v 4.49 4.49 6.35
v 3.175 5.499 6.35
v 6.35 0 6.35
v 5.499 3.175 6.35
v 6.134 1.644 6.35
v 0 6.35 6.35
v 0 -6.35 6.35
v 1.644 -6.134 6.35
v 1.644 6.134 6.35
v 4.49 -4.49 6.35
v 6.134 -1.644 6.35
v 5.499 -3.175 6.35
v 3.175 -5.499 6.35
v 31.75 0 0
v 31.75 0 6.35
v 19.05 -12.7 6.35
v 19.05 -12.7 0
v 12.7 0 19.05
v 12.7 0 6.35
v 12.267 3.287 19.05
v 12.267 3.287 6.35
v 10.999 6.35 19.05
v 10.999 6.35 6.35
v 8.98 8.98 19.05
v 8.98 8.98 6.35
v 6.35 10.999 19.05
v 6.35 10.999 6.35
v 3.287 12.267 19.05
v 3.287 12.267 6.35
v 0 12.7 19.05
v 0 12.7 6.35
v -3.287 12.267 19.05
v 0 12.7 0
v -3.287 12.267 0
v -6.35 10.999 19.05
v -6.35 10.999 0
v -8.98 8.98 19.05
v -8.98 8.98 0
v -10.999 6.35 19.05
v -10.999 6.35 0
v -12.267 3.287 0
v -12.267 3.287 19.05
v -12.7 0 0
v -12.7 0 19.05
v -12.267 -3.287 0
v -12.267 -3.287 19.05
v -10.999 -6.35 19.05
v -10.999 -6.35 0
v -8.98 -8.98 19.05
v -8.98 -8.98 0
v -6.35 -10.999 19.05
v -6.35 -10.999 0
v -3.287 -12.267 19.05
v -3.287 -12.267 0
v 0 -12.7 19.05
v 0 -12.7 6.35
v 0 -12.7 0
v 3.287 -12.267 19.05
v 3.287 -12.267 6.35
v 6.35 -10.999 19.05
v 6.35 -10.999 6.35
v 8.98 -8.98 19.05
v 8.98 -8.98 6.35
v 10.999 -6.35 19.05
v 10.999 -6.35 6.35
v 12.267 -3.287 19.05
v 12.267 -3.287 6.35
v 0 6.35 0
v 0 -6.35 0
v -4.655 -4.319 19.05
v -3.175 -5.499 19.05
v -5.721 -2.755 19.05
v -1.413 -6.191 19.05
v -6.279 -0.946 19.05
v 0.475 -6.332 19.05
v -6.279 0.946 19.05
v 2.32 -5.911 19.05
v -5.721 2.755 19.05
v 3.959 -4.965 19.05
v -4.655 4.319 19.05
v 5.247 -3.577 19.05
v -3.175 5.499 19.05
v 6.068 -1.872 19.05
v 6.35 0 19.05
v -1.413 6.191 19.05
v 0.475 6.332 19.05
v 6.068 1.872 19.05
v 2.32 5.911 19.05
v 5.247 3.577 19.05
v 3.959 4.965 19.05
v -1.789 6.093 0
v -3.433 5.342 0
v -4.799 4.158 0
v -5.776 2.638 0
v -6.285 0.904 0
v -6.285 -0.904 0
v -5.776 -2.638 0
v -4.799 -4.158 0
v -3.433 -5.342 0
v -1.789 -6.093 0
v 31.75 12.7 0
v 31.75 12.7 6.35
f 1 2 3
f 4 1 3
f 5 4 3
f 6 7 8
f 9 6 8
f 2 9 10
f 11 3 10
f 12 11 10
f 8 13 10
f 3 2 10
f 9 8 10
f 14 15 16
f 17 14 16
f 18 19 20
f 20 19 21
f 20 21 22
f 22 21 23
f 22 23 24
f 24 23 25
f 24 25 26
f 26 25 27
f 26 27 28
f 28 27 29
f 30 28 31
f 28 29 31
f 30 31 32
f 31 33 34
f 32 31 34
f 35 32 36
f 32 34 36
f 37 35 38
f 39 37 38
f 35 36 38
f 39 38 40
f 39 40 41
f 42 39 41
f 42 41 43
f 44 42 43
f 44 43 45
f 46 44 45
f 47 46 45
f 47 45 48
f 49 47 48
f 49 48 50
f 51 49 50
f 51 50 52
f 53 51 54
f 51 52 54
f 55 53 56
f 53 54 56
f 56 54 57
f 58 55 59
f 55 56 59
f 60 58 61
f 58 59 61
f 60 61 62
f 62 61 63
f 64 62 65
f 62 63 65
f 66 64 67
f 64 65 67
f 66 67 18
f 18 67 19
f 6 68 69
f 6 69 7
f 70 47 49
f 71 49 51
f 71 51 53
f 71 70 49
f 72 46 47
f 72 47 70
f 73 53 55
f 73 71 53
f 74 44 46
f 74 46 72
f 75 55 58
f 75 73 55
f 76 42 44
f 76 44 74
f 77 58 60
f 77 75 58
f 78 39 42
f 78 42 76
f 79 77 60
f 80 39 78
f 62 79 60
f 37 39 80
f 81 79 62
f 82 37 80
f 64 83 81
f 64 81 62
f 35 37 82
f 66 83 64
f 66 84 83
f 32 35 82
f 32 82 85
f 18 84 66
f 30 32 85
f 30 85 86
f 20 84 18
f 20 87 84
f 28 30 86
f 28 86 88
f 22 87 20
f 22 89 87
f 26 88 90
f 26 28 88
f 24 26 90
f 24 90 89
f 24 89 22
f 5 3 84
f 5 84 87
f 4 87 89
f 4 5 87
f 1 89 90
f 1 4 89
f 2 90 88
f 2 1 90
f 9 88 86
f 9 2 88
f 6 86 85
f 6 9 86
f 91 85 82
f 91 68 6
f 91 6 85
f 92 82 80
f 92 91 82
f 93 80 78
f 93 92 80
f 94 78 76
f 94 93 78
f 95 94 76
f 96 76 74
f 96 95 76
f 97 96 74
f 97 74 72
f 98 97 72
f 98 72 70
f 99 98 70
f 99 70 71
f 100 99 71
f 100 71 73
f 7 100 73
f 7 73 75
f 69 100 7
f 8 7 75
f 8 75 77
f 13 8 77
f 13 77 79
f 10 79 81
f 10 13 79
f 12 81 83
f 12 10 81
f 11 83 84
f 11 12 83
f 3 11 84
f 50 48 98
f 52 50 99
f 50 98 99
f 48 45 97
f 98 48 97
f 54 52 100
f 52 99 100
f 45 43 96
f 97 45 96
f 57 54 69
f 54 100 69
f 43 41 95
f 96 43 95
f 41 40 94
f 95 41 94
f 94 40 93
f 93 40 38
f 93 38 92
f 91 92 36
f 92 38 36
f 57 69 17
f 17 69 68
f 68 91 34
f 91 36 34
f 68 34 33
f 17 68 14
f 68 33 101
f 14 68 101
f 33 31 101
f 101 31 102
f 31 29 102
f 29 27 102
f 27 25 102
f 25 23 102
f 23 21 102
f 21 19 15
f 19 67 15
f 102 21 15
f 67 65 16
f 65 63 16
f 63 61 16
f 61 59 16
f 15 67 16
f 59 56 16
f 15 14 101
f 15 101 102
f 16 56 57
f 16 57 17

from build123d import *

# Parameters (mm, degrees)
F0_R     = 12.7
F0_R_2   = 6.35
F1_DEPTH = 19.05
F2_W     = 31.75
F2_H     = 6.35
F3_DEPTH = 12.7
F5_DEPTH = 6.35


with BuildPart() as f1:
    # F0 (on Top) → F1 (new body)
    with BuildSketch(Plane.XY):
        Circle(F0_R)
        Circle(F0_R_2, mode=Mode.SUBTRACT)
    extrude(amount=F1_DEPTH)

    # F2 (on Front) → F3 (join, symmetric)
    with BuildSketch(Plane.XZ):
        with Locations((15.875, 3.175)):
            Rectangle(F2_W, F2_H)
    extrude(amount=F3_DEPTH, both=True)

    # F4 (on face) → F5 (cut)
    with BuildSketch(Plane.XY.offset(6.35)):
        Polygon((31.75, -12.7), (31.75, 0), (19.05, -12.7), align=None)
    extrude(amount=-F5_DEPTH, mode=Mode.SUBTRACT)


solid = f1.part
